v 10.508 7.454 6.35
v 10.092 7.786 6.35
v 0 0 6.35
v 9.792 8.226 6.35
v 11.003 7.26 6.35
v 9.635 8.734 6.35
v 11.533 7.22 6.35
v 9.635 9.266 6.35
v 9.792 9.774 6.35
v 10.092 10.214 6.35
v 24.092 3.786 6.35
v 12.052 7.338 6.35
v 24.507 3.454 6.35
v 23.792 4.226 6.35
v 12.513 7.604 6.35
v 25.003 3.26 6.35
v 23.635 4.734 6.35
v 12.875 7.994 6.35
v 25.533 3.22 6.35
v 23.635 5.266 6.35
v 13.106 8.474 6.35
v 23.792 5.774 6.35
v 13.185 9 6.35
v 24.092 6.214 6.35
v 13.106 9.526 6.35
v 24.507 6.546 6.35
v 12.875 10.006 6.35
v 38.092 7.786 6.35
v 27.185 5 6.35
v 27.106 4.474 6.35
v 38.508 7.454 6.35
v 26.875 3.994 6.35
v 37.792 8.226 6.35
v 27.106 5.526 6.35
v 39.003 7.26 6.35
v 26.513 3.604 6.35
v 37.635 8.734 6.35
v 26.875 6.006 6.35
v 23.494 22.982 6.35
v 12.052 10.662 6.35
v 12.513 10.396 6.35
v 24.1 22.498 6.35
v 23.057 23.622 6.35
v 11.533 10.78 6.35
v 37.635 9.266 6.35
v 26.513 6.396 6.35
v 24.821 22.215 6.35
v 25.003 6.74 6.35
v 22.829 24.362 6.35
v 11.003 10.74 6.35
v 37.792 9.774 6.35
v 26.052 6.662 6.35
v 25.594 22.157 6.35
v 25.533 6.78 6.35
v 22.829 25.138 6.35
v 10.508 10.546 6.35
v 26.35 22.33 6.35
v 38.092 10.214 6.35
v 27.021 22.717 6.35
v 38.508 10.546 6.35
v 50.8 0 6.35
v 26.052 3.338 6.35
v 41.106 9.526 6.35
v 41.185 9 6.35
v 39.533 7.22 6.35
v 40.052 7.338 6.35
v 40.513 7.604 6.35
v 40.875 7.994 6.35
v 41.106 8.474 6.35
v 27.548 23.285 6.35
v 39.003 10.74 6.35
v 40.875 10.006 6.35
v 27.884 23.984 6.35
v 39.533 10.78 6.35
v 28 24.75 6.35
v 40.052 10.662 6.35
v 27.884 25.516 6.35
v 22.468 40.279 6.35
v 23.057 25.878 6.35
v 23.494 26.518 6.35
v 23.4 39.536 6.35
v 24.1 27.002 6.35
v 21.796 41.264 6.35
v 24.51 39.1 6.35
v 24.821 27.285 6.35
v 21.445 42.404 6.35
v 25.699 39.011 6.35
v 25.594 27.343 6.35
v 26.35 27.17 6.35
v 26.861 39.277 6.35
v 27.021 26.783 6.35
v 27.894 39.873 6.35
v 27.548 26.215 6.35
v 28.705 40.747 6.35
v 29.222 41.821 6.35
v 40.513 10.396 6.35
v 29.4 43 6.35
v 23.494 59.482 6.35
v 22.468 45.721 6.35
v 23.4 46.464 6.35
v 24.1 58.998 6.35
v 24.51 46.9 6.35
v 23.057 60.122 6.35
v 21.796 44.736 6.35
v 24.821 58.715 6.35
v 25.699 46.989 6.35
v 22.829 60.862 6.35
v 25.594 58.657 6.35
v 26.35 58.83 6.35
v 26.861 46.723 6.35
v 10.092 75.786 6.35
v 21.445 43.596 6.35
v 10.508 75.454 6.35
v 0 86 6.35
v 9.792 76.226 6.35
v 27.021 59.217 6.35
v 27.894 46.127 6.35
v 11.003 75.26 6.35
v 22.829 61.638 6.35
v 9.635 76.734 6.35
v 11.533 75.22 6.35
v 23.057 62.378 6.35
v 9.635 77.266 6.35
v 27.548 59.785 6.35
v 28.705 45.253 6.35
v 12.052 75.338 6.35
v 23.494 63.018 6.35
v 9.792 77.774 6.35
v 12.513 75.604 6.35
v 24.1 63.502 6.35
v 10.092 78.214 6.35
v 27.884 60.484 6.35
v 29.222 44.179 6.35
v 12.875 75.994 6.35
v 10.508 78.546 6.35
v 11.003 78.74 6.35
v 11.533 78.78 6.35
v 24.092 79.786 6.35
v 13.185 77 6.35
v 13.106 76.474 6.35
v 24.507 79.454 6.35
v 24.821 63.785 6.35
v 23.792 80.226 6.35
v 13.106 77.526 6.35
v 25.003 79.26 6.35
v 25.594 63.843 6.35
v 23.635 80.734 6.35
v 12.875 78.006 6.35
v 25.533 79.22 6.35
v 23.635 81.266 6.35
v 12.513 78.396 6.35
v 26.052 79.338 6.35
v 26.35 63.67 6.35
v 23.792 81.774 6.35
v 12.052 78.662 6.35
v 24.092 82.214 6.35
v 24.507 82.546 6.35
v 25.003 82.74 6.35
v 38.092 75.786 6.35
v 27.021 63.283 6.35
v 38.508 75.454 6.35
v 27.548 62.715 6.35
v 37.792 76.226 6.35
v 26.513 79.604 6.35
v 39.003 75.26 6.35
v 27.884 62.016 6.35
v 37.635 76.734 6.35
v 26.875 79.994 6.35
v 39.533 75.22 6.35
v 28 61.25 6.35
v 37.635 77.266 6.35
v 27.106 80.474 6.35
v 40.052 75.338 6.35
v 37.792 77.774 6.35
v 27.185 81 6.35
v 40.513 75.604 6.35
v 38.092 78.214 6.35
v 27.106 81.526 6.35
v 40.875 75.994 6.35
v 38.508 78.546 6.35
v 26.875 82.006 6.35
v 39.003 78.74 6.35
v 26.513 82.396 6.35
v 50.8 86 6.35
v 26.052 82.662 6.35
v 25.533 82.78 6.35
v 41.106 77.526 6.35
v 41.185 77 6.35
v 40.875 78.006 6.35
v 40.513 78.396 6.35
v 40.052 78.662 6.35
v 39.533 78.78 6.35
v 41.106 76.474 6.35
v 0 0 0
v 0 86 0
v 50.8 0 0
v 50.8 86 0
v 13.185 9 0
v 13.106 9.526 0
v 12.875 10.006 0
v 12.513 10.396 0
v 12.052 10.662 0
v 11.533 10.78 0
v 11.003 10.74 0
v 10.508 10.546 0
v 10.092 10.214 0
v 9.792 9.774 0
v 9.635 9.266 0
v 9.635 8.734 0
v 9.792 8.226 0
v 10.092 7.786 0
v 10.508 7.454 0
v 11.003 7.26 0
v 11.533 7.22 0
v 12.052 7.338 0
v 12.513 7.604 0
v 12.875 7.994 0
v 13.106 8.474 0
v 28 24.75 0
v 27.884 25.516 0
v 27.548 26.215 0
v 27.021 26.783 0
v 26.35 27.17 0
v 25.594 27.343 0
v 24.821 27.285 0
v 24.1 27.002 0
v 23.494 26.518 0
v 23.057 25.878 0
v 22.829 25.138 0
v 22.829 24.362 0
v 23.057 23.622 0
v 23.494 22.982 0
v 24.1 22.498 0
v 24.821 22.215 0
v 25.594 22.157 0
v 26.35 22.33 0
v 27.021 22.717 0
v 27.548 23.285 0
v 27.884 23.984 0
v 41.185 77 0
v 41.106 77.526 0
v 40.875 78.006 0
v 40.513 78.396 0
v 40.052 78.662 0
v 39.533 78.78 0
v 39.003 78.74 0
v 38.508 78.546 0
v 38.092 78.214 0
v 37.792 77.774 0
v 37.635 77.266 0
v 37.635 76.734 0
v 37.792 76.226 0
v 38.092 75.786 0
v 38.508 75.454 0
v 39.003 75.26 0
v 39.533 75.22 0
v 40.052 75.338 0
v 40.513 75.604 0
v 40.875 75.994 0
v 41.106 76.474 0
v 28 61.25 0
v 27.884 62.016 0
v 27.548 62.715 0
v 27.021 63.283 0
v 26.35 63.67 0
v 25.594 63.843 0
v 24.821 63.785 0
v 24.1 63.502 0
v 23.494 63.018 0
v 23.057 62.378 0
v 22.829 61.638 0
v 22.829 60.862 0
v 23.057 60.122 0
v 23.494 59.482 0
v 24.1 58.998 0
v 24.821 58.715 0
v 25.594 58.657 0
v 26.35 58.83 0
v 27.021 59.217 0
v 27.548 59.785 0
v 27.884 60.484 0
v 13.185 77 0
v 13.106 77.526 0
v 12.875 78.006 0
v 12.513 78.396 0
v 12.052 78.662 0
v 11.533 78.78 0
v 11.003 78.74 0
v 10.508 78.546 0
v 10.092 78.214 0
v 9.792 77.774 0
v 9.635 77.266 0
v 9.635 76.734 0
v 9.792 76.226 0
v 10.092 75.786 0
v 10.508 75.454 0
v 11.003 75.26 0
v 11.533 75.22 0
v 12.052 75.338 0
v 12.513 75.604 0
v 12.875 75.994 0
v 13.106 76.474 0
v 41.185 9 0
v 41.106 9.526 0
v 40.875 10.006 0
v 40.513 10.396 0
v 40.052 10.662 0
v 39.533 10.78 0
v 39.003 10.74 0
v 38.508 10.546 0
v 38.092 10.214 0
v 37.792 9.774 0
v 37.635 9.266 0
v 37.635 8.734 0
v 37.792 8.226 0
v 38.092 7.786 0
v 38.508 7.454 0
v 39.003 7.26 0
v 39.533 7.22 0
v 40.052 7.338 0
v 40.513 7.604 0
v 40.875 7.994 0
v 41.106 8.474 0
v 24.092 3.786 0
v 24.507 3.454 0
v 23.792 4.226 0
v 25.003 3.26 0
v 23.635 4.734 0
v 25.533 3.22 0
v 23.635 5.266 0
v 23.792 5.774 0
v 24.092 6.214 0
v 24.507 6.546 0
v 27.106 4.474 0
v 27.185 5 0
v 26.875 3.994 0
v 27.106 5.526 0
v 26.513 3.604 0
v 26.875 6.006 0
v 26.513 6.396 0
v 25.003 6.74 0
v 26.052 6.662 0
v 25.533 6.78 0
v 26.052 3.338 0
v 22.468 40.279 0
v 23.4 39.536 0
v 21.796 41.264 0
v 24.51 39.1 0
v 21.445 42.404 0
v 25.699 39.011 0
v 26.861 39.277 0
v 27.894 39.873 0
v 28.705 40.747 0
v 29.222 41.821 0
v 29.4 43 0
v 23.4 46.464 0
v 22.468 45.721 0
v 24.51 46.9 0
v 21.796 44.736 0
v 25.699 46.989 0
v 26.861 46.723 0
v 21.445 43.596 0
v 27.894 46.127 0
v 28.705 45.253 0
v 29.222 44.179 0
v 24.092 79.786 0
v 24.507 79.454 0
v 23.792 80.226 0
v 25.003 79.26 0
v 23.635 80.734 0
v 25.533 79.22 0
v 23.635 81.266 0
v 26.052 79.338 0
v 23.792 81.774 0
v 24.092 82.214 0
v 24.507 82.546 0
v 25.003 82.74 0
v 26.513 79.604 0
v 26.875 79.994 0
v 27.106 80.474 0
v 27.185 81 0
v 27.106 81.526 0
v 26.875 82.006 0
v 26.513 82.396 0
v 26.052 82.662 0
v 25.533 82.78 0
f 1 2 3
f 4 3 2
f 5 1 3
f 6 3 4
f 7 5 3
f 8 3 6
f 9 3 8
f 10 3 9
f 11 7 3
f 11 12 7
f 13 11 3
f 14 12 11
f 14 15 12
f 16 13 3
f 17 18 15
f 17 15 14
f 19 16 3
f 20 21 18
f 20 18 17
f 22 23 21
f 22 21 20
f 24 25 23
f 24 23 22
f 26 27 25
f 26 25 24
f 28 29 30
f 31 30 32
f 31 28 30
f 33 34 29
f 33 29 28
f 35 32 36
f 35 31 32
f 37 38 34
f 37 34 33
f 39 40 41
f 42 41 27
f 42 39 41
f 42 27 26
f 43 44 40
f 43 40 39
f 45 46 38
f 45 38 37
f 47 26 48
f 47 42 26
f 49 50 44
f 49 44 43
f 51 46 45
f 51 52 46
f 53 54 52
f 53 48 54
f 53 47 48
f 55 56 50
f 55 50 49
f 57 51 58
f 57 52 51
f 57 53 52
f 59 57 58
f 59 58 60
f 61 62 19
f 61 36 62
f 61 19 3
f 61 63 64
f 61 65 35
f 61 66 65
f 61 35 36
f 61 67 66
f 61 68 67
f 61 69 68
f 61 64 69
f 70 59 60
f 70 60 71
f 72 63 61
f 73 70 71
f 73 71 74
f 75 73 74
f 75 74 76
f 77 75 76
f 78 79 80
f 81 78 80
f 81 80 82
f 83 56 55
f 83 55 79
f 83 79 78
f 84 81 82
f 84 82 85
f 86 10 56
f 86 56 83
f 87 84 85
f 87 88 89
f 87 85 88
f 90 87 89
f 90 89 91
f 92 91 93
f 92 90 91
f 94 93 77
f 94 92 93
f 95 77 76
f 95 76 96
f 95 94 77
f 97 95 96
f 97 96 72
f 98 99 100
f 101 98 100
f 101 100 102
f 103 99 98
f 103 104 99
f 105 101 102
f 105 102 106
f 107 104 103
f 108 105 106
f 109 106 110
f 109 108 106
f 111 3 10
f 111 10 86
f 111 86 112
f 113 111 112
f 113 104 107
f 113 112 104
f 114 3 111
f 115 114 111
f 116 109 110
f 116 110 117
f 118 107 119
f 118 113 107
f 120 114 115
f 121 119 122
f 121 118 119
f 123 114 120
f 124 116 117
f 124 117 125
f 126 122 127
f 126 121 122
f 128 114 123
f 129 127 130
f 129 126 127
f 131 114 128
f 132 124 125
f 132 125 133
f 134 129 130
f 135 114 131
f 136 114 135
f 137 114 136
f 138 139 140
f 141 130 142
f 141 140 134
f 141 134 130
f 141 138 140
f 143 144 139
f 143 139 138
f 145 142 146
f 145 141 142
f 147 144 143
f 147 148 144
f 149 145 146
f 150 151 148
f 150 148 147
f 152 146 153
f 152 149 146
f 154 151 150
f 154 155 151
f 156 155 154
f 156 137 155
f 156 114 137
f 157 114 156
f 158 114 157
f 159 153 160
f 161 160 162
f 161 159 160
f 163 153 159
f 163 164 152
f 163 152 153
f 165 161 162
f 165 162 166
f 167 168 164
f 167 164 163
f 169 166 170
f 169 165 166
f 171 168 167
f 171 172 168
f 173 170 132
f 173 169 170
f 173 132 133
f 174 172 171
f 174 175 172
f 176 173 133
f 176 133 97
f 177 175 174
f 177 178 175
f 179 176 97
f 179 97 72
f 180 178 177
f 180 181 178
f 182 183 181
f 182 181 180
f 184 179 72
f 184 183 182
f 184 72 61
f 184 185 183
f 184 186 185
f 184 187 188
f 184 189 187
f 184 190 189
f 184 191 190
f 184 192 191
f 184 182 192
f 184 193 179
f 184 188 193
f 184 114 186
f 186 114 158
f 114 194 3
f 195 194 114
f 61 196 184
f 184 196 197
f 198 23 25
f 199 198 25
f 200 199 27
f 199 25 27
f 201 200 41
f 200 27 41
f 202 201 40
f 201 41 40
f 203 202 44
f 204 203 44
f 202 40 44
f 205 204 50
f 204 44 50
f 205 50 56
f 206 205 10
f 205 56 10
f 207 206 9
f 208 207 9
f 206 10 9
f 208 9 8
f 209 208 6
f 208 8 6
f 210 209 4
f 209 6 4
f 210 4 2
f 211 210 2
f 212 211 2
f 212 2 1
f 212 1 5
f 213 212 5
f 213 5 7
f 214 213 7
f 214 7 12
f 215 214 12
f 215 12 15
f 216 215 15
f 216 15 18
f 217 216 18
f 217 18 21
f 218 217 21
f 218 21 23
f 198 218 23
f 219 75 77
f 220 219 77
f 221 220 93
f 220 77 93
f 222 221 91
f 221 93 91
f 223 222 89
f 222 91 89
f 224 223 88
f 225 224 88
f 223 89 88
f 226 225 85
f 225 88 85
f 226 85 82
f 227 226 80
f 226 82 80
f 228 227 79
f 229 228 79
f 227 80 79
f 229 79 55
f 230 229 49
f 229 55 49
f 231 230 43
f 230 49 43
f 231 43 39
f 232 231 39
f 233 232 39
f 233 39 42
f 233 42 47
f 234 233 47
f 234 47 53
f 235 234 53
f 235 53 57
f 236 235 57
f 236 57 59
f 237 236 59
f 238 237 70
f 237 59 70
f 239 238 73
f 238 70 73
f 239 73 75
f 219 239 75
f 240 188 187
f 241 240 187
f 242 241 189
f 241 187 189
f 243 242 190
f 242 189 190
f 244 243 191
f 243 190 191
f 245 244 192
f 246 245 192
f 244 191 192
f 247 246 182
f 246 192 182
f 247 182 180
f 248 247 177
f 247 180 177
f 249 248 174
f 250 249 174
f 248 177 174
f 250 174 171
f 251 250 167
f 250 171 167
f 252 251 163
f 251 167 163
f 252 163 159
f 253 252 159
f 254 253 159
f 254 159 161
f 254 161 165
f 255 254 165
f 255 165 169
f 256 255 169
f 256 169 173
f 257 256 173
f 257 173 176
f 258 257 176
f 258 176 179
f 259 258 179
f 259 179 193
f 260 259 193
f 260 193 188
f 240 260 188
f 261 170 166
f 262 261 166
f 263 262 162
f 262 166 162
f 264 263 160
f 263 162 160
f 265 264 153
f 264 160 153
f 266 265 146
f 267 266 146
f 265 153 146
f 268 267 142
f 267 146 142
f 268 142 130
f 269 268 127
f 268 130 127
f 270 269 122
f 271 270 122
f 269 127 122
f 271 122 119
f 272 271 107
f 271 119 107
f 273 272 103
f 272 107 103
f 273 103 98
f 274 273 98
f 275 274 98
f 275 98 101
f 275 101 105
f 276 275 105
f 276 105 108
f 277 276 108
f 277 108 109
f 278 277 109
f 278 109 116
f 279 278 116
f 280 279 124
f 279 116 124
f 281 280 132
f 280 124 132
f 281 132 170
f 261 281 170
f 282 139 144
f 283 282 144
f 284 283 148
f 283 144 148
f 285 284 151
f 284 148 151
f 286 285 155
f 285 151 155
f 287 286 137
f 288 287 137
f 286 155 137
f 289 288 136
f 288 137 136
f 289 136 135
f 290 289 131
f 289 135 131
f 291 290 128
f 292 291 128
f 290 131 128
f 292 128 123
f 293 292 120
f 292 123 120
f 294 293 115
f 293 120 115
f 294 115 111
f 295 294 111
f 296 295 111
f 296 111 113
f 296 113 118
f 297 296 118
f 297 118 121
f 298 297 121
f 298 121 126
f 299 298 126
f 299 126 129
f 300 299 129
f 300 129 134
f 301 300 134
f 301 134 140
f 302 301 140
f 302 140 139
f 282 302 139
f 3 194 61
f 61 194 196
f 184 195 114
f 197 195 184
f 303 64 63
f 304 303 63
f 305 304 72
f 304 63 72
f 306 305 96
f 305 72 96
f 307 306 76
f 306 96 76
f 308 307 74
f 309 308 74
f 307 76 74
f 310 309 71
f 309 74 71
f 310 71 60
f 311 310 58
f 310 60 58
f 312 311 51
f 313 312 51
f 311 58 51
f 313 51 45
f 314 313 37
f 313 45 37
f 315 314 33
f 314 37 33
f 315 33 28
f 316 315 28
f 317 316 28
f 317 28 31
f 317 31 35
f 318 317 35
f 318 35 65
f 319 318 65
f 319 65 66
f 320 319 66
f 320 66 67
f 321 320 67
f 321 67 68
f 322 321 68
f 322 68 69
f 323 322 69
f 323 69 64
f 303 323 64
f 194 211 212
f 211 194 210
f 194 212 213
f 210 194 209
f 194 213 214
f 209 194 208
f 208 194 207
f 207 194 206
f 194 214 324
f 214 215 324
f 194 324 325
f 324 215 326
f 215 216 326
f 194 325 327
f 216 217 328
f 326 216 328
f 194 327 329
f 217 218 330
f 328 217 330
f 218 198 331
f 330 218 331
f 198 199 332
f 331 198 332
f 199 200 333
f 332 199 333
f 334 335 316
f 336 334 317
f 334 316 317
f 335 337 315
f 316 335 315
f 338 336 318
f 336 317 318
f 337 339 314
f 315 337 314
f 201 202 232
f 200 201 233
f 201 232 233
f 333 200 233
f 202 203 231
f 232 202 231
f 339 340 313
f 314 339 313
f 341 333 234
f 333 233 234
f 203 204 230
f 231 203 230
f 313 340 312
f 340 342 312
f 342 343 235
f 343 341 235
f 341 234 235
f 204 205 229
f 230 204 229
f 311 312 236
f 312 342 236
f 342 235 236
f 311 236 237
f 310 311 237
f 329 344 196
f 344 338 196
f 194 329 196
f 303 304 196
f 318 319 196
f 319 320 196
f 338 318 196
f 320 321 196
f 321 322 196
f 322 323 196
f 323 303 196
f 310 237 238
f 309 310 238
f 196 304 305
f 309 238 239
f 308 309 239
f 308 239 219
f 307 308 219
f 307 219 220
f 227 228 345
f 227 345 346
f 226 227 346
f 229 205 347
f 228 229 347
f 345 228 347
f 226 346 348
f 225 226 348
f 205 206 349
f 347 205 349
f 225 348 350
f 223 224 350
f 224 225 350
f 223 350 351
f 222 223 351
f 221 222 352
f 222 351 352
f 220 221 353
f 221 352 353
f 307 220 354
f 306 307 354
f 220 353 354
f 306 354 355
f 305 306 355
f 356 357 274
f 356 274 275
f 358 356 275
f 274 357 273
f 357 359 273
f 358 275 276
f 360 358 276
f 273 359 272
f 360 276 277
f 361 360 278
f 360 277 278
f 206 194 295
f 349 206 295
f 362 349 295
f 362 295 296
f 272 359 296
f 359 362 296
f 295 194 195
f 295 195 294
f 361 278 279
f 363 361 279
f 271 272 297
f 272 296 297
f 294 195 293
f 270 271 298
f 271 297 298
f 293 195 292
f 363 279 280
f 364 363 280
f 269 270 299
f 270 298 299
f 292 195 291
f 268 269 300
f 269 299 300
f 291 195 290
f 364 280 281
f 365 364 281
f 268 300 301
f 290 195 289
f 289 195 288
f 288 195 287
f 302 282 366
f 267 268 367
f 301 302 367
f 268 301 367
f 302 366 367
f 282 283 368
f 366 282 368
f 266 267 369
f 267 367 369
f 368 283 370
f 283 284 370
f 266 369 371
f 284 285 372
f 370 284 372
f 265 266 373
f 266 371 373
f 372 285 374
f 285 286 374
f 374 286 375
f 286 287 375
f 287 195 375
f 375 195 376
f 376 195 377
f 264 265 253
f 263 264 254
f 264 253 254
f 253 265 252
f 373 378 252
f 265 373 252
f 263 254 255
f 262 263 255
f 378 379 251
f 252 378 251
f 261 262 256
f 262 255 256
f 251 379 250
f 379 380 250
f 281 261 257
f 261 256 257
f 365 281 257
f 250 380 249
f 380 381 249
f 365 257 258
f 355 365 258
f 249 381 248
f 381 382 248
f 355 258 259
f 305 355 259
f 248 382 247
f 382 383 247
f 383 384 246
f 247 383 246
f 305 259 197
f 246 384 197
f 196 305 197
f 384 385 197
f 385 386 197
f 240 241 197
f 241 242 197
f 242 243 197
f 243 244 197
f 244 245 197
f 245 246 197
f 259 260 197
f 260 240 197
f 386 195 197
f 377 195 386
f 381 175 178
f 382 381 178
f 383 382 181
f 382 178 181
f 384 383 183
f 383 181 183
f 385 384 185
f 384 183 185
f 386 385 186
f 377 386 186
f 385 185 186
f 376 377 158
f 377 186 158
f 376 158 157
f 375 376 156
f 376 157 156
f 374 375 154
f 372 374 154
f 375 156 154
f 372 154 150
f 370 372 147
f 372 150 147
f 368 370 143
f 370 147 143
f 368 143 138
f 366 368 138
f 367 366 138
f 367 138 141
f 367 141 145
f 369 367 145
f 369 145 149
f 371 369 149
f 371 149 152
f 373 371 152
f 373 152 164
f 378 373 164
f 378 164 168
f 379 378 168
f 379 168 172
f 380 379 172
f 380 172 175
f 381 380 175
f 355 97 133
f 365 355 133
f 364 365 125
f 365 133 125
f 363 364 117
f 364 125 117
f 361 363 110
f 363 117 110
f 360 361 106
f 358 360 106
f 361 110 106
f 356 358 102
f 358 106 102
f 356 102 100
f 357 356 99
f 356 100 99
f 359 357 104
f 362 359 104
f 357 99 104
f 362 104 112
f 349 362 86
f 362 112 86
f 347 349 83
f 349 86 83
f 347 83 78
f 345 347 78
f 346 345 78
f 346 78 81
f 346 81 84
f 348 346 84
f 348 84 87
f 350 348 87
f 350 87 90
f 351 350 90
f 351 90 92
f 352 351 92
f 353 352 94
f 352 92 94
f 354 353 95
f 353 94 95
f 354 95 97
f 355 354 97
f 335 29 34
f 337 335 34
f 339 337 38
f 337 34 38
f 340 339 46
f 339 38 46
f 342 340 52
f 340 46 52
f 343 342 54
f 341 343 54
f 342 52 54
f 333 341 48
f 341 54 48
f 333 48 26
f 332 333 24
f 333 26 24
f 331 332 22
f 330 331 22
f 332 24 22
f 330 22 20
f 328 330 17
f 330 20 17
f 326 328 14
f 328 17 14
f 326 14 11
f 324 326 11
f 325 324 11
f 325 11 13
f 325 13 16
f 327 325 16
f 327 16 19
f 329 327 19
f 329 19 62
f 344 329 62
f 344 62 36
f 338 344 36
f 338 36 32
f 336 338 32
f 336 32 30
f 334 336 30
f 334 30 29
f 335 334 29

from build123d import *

# Parameters (mm, degrees)
CROQUIS1_W              = 50.8
CROQUIS1_H              = 86
SALIENTE_EXTRUIR1_DEPTH = 6.35
CROQUIS2_R              = 4
CROQUIS2_R_2            = 2.6
CORTAR_EXTRUIR1_DEPTH   = 6.35
CROQUIS3_R              = 1.785
CORTAR_EXTRUIR2_DEPTH   = 7.35


with BuildPart() as part:
    # Croquis1 → Saliente-Extruir1 (new body)
    with BuildSketch(Plane.XY):
        with Locations((25.4, 43)):
            Rectangle(CROQUIS1_W, CROQUIS1_H)
    extrude(amount=SALIENTE_EXTRUIR1_DEPTH)

    # Croquis2 → Cortar-Extruir1 (cut)
    with BuildSketch(Plane.XY.offset(6.35)):
        with Locations((25.4, 43)):
            Circle(CROQUIS2_R)
        with Locations((25.4, 61.25)):
            Circle(CROQUIS2_R_2)
        with Locations((25.4, 24.75)):
            Circle(CROQUIS2_R_2)
    extrude(amount=-CORTAR_EXTRUIR1_DEPTH, mode=Mode.SUBTRACT)

    # Croquis3 → Cortar-Extruir2 (cut, through all)
    with BuildSketch(Plane.XY.offset(6.35)):
        with Locations((25.4, 81)):
            Circle(CROQUIS3_R)
        with Locations((11.4, 77)):
            Circle(CROQUIS3_R)
        with Locations((39.4, 77)):
            Circle(CROQUIS3_R)
        with Locations((39.4, 9)):
            Circle(CROQUIS3_R)
        with Locations((11.4, 9)):
            Circle(CROQUIS3_R)
        with Locations((25.4, 5)):
            Circle(CROQUIS3_R)
    extrude(amount=-CORTAR_EXTRUIR2_DEPTH, mode=Mode.SUBTRACT)


solid = part.part
